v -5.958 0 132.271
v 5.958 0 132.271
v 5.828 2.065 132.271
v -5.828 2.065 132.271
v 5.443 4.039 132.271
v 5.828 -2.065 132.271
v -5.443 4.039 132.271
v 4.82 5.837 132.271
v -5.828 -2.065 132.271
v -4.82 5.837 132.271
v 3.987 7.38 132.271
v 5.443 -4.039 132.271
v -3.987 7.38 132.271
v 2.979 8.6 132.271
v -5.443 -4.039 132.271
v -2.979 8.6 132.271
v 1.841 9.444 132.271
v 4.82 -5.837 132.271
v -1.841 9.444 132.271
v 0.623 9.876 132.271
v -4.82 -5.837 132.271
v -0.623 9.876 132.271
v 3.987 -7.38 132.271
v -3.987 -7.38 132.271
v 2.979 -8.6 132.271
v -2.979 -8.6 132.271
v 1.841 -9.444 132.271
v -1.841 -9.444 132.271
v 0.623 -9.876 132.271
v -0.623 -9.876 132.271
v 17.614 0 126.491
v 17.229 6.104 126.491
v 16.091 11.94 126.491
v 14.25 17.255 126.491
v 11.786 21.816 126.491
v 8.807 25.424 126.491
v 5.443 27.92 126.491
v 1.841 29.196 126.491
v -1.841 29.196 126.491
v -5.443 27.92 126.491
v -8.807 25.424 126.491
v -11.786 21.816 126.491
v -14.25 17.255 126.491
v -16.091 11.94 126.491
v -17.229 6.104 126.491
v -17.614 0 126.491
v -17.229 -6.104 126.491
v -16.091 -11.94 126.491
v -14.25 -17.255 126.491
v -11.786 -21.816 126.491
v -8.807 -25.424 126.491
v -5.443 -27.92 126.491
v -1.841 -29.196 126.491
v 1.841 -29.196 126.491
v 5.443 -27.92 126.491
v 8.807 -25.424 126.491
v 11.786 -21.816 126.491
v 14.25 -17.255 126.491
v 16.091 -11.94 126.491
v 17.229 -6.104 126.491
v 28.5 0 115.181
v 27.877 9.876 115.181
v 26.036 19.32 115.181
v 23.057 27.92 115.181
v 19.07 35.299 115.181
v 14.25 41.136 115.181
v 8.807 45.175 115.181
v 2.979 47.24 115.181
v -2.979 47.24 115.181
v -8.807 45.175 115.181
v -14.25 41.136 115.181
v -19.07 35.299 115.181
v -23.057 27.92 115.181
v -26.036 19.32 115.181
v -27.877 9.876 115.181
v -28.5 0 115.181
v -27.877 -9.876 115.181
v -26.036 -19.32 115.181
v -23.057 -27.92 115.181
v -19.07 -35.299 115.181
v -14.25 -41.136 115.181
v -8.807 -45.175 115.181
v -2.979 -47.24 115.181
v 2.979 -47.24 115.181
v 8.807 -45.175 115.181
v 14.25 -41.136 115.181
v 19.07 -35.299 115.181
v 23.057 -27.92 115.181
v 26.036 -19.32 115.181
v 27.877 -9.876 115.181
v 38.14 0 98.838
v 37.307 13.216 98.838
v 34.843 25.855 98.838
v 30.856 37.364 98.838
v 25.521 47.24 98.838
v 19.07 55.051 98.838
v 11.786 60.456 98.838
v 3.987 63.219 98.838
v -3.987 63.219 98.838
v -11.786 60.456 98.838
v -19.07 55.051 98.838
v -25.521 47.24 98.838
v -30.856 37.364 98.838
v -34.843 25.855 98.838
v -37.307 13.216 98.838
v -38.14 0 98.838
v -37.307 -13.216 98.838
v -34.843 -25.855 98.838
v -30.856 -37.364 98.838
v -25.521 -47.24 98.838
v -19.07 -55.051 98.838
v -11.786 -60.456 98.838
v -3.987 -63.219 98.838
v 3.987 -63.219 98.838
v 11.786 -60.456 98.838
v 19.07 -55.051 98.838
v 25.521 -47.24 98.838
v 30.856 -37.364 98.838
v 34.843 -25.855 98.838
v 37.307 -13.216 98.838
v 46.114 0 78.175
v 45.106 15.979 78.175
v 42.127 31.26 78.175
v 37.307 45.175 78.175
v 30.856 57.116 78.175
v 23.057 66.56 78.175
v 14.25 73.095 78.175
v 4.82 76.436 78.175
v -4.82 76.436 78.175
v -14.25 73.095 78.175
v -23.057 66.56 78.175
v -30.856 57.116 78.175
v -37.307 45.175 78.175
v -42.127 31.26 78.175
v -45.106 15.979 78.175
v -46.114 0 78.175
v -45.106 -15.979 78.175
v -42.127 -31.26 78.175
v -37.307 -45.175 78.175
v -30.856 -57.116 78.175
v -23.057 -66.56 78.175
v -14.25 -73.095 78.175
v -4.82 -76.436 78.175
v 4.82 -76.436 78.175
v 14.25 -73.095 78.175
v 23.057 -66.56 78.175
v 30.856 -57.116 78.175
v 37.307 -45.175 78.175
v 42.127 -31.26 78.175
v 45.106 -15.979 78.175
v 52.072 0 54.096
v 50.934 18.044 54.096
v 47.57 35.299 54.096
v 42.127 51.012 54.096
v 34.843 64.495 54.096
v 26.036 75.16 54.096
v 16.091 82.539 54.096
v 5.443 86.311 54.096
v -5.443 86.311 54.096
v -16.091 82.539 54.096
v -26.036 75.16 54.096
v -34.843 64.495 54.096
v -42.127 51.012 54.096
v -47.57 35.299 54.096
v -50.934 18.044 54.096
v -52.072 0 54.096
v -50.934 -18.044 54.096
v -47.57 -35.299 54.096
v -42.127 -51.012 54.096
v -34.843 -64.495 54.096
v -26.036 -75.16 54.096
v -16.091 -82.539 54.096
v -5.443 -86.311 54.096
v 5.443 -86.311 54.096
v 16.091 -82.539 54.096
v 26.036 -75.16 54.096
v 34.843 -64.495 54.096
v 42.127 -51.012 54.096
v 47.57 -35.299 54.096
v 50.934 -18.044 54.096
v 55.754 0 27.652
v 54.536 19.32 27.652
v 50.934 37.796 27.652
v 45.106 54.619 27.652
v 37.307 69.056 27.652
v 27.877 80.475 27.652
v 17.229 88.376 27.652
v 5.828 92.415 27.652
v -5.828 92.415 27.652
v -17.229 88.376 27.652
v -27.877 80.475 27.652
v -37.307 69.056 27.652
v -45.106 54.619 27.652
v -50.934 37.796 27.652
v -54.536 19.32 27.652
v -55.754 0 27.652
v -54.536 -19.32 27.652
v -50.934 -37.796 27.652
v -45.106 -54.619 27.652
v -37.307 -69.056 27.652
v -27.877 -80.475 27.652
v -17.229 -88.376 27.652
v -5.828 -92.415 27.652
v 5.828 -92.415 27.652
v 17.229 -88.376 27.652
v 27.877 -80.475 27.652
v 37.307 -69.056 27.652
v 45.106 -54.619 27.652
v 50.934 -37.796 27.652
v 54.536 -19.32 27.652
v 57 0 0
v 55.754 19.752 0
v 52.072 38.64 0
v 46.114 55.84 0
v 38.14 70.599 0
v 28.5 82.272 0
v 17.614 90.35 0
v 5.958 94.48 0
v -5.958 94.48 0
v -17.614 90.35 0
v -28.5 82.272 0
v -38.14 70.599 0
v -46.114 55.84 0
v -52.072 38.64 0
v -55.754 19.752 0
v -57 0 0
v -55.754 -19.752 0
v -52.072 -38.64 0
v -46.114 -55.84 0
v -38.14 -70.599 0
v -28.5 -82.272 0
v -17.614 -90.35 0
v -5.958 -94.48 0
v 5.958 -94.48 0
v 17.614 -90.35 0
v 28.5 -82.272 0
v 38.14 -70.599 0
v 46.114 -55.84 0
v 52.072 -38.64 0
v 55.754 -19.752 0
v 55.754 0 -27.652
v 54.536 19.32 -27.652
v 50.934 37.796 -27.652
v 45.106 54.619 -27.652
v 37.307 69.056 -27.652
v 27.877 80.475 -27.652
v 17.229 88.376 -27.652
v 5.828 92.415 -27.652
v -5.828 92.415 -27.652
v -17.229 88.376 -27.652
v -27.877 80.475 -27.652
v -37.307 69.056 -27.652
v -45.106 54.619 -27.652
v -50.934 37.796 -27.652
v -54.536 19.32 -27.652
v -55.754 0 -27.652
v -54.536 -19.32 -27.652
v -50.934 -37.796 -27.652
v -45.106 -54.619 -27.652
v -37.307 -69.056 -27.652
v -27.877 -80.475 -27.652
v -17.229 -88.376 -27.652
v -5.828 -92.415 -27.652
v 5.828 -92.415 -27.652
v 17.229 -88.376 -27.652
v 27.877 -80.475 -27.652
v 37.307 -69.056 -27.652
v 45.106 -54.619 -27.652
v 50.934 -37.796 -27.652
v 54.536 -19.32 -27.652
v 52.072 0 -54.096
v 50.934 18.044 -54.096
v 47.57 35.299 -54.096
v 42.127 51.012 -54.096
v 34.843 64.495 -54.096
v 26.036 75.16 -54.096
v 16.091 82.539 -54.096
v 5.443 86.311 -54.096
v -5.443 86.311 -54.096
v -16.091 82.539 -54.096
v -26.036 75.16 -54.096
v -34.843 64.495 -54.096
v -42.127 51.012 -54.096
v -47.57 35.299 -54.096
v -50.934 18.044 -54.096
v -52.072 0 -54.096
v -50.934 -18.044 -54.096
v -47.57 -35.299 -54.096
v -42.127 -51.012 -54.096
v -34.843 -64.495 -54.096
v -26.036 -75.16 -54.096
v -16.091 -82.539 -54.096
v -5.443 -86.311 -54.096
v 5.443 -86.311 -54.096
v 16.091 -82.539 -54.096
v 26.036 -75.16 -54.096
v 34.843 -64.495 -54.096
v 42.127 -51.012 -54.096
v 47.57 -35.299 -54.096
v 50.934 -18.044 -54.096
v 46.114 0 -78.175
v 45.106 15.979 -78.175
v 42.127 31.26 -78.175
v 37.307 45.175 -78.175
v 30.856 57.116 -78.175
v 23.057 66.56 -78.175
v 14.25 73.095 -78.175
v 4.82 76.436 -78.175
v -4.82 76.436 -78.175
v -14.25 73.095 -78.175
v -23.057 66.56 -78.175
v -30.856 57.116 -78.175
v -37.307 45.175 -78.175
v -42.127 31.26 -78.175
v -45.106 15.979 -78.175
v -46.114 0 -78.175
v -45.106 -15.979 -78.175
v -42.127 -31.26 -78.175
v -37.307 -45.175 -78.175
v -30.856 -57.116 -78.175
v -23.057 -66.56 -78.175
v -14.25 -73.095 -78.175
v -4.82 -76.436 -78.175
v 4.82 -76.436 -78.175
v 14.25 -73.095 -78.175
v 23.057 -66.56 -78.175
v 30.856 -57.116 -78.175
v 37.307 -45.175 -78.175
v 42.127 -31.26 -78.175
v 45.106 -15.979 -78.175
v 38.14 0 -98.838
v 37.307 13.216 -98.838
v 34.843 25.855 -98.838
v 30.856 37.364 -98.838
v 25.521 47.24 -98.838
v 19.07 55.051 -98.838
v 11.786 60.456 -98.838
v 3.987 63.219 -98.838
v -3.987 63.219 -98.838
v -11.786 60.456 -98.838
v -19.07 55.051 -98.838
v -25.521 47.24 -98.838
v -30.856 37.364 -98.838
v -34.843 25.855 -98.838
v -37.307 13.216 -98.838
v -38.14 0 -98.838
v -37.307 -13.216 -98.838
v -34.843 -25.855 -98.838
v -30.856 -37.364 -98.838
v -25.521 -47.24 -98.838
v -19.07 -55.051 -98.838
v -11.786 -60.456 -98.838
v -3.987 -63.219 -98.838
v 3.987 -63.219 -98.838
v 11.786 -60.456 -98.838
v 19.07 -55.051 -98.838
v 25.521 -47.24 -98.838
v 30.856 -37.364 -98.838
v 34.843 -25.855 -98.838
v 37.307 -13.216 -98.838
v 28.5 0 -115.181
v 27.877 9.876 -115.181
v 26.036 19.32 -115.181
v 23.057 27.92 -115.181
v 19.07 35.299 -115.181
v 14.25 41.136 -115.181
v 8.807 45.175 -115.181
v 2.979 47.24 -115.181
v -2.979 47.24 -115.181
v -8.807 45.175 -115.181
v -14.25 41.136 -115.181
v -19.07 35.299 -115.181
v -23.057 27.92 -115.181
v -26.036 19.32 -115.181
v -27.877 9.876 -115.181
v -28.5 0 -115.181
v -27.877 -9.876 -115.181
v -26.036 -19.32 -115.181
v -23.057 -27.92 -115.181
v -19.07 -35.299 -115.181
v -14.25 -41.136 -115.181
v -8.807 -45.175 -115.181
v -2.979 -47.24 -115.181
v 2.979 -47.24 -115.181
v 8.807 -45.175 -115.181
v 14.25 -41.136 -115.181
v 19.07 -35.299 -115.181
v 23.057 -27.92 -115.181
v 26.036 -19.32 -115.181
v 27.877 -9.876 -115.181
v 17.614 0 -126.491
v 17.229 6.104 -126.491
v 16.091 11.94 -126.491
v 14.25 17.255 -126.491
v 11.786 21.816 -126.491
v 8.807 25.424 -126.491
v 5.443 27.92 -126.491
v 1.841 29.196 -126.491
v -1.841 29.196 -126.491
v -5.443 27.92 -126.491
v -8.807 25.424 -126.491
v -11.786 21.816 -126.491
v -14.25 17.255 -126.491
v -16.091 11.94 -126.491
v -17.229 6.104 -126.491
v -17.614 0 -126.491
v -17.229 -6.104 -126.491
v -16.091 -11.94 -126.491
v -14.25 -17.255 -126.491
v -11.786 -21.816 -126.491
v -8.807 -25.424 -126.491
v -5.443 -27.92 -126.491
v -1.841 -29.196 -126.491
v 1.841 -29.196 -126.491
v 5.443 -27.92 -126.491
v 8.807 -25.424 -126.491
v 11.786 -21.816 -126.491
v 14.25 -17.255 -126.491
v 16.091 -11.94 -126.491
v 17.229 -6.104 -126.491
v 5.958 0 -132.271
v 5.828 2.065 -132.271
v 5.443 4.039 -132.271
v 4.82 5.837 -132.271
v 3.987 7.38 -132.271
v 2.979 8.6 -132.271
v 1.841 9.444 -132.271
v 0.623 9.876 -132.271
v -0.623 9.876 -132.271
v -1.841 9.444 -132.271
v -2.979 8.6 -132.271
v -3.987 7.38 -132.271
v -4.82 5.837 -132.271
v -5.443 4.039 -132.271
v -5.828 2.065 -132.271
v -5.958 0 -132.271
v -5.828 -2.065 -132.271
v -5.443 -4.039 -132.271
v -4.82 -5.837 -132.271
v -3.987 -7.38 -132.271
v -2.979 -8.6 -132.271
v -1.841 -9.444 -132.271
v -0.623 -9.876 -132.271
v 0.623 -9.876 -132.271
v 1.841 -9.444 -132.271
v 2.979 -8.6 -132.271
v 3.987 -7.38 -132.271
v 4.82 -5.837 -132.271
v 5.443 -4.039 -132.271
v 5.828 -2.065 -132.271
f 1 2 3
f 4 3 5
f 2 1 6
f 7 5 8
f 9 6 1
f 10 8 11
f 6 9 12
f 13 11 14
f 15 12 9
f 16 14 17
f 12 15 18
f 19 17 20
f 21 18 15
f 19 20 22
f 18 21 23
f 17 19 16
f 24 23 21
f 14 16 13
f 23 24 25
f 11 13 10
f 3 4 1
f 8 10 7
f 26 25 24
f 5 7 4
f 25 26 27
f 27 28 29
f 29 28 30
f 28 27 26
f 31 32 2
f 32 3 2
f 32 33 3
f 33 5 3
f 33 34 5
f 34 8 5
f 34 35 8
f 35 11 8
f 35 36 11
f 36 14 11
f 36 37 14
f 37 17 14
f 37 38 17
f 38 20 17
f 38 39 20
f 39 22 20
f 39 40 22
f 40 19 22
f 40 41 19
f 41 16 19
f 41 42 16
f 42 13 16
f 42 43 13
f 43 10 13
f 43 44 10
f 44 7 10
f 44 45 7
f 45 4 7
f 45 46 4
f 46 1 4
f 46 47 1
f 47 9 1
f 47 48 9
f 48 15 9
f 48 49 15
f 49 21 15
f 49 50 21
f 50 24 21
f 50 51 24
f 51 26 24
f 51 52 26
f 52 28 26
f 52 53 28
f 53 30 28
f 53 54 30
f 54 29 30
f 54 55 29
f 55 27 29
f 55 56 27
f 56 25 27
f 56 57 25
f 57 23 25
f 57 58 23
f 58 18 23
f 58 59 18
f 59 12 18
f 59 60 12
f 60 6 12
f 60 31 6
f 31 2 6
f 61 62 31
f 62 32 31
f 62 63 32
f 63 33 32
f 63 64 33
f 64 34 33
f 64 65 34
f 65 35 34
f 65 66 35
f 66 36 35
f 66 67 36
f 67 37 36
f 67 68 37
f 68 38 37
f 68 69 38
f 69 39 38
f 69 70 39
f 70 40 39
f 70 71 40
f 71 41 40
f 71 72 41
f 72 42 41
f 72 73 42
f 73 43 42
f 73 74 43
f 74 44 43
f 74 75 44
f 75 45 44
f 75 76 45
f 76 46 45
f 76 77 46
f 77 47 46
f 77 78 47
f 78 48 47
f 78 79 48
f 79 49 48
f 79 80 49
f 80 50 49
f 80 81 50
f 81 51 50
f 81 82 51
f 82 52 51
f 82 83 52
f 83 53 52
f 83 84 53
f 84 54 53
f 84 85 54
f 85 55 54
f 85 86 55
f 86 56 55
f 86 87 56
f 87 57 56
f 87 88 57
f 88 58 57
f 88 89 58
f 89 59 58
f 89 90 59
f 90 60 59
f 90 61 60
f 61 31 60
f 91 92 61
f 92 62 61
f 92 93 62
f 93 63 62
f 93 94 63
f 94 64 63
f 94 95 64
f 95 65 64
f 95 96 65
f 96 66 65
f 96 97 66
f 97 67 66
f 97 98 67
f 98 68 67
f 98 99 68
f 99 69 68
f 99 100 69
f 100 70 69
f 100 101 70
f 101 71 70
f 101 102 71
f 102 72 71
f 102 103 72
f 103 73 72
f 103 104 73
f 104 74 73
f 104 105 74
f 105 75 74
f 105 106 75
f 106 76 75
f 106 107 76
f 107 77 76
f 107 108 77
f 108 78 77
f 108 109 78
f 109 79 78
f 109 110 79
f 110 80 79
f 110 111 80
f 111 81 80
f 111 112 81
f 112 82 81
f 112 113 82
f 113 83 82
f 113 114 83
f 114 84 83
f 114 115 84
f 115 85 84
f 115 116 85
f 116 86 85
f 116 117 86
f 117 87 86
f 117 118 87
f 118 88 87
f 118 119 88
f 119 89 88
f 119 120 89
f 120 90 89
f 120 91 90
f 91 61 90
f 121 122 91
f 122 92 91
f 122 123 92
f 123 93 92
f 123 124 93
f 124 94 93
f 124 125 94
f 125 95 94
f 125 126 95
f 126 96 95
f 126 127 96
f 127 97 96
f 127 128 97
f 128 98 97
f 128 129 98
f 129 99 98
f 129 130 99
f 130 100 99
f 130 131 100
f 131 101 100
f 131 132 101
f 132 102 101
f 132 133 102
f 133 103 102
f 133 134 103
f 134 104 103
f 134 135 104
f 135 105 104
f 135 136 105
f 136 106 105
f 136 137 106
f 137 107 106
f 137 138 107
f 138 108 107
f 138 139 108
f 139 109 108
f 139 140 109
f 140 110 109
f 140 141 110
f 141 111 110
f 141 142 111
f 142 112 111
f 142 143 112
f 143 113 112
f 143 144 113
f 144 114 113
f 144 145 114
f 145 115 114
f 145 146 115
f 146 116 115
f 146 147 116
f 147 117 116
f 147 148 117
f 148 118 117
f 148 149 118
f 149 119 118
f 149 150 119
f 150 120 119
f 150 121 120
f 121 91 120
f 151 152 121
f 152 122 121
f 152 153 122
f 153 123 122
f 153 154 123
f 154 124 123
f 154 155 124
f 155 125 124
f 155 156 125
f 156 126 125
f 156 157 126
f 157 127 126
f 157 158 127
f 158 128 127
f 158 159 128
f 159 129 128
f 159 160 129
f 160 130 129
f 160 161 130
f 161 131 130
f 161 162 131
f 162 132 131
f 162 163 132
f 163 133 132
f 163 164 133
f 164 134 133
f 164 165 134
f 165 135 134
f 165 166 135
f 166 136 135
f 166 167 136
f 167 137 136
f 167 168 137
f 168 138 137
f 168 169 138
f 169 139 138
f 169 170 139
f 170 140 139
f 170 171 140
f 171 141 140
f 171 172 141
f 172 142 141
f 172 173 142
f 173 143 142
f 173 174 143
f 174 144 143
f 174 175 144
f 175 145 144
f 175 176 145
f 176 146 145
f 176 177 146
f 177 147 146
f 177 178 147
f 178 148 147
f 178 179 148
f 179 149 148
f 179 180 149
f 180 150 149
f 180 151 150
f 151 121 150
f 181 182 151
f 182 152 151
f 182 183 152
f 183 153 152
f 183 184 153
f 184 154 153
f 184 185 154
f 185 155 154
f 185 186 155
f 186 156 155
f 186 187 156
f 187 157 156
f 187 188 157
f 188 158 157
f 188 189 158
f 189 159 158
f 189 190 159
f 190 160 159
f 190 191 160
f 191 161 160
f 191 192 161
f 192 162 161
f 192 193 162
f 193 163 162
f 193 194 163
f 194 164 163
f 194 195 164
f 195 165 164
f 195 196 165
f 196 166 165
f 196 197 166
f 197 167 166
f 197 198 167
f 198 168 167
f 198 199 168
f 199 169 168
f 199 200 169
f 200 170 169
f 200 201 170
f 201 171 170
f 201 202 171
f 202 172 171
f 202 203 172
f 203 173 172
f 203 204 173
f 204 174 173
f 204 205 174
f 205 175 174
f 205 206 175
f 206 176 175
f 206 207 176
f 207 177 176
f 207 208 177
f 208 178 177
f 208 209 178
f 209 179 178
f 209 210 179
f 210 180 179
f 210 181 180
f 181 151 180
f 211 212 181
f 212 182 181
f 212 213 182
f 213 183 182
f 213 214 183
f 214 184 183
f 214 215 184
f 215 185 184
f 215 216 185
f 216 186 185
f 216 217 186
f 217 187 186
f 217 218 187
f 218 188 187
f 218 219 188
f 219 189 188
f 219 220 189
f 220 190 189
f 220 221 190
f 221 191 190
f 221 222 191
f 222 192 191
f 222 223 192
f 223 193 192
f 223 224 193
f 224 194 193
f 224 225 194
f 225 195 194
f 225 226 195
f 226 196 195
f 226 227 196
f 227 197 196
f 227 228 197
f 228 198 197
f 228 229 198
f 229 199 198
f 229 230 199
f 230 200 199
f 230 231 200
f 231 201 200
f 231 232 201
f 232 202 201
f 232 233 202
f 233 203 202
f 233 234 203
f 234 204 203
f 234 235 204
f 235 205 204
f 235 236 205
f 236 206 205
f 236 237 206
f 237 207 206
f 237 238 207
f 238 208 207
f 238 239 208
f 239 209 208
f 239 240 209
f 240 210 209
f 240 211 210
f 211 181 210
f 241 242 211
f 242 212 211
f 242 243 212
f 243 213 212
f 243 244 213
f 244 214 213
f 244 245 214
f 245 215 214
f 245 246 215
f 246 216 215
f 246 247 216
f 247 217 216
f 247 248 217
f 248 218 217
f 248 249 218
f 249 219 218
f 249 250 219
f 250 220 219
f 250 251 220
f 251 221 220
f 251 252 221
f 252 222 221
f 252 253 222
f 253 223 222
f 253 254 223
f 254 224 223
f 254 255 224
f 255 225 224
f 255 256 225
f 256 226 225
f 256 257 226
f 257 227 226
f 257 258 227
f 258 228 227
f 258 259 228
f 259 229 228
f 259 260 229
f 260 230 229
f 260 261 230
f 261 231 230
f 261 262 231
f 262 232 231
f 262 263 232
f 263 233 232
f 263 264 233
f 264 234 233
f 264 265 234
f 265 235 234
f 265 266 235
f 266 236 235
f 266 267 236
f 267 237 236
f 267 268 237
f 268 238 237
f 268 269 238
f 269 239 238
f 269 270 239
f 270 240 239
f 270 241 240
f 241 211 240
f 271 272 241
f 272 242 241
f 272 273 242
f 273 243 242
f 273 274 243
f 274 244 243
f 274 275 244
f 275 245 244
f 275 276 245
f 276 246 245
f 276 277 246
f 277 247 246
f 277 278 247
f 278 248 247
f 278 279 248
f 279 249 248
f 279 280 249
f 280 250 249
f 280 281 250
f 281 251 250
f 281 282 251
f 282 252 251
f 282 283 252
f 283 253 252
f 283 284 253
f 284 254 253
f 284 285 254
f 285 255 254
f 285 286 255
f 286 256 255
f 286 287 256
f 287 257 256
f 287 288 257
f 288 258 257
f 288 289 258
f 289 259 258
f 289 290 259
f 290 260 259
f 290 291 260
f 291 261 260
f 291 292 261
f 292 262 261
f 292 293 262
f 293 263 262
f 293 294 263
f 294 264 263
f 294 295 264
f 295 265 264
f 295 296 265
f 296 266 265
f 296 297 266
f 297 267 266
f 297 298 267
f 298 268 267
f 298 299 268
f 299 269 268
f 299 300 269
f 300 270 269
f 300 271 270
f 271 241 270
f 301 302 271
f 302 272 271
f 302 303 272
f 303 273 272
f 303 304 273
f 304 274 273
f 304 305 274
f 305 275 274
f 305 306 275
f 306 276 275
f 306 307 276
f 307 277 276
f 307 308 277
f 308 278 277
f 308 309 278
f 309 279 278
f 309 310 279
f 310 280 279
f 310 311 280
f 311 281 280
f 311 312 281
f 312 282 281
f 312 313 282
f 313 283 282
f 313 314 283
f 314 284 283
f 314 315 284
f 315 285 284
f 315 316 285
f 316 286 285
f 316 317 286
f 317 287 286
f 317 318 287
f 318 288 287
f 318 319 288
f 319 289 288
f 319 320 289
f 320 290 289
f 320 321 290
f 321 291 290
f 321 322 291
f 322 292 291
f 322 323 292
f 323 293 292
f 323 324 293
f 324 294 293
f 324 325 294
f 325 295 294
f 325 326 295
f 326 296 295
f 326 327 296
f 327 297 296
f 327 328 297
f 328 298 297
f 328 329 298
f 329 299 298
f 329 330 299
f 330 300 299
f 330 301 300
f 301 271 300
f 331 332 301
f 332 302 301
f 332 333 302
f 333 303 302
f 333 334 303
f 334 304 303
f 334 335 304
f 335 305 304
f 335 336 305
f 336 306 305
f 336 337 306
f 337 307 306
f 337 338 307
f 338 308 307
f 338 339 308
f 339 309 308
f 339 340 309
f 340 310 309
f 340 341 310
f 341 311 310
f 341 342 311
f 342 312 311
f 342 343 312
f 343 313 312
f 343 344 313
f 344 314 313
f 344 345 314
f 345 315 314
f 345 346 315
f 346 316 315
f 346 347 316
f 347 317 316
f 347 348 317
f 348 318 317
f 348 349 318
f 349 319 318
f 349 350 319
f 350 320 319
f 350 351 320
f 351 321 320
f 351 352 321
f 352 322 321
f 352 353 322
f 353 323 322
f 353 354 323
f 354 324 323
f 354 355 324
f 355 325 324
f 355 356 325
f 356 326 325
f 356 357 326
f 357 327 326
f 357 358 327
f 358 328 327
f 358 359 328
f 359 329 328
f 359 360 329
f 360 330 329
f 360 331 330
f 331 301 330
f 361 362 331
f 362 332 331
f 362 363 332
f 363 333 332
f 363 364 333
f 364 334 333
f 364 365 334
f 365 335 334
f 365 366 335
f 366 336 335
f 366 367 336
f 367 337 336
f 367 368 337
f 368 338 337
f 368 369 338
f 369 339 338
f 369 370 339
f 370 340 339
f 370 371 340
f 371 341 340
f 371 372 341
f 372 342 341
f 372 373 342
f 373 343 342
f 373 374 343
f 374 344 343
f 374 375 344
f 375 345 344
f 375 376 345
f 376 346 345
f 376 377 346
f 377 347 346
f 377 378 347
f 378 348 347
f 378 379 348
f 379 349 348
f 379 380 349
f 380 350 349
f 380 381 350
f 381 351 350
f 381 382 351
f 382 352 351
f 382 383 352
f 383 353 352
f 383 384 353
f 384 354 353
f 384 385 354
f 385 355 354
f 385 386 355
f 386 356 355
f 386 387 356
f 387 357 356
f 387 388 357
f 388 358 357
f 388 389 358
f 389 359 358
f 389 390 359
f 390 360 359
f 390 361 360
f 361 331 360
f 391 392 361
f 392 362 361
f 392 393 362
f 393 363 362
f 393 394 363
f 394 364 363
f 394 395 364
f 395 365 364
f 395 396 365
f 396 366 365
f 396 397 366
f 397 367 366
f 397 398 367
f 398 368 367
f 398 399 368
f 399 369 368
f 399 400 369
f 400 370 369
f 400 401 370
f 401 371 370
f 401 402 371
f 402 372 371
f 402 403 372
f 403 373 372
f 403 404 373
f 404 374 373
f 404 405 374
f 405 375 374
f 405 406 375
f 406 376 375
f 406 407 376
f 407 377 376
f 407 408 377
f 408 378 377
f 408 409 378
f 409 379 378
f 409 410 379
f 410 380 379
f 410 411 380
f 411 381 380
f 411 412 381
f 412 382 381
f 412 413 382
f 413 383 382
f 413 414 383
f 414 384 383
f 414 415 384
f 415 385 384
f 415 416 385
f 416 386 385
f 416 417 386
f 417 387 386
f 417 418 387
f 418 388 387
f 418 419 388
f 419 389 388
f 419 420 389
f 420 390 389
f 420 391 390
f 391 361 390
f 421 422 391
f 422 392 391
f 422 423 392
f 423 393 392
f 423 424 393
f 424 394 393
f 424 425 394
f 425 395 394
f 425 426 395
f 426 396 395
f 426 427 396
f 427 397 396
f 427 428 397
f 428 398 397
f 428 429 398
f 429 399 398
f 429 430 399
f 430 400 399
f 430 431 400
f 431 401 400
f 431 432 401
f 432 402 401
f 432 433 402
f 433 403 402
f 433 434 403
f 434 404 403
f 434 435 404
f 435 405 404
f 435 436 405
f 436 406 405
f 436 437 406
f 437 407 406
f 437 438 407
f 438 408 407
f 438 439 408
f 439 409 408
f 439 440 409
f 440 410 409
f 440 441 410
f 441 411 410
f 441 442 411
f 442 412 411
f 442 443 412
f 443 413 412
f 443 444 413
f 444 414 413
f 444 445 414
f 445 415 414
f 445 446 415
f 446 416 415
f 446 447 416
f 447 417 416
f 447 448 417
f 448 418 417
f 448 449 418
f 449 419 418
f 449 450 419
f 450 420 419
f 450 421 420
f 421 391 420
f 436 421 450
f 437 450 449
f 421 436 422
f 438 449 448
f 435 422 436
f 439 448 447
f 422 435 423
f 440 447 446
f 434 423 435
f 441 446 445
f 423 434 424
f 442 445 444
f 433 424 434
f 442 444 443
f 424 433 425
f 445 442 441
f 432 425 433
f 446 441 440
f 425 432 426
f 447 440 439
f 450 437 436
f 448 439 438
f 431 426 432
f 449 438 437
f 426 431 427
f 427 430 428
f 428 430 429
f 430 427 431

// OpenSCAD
// Generated by SolidPython 1.0.1 on 2020-07-29 00:39:25


scale(v = [3, 5, 7]) {
	sphere(r = 19);
}
/***********************************************
*********      SolidPython code:      **********
************************************************
 
# import packages: SolidPython
from solid import *
from solid.utils import *
from itertools import chain, combinations


class Resize:

    def __init__(self, scad_file):
        self.scad_file = scad_file
        #self.scad_file = import_scad(scad_file)
        # cone/cylinder param:
        self.r1 = 0
        self.r2 = 0
        self.h = 0
        # rectangular prism param:
        self.w = 0
        self.l = 0
        # ellipse param:
        self.r = 0

    # import OpenScad code (file name corresponds to shape)


    # classify shape + parameters
    def assign(self, param1, param2, param3):
        if self.scad_file == 'cone.scad':
            self.r1 = param1
            self.r2 = param2
            self.h = param3
        elif self.scad_file == 'cylinder.scad':
            self.r1 = param1
            self.r2 = param2
            self.h = param3
        elif self.scad_file == 'rectangularPrism.scad':
            self.h = param1
            self.l = param2
            self.w = param3
        else:
            self.r = param1
            self.h = param2

    # resize parameters
    def iterate(self):
        x = range(3, 20, 2)
        i = 1
        if self.scad_file == 'cone.scad':
            tempList = list(combinations(x, 2))
            for temp in tempList:
                param1 = temp[0]
                param2 = temp[1]
                filepath = 'produced_scad_files/' + 'cone' + str(param1) + '_' + str(param2) + '_' + '.scad'
                scad_render_to_file(cylinder(h=param1, r1=param2, r2=0), filepath)

        elif self.scad_file == 'cylinder.scad':
            tempList = list(combinations(x, 3))
            for temp in tempList:
                param1 = temp[0]
                param2 = temp[1]
                filepath = 'produced_scad_files/' + 'cylinder' + str(param1) + '_' + str(param2) + '_' + '.scad'
                scad_render_to_file(cylinder(h=param1, r1=param2, r2=param2), filepath)

        elif self.scad_file == 'rectangularPrism.scad':
            tempList = list(combinations(x, 3))
            for temp in tempList:
                param1 = temp[0]
                param2 = temp[1]
                param3 = temp[2]
                filepath = 'produced_scad_files/' + 'rectangularPrism' + str(param1) + '_' + str(param2) + '_' + str(
                    param3) + '.scad'
                scad_render_to_file(cube(size=(param1, param2, param3)), filepath)

        elif self.scad_file == 'ellipse.scad':
            tempList = list(combinations(x, 4))
            for temp in tempList:
                param1 = temp[0]
                param2 = temp[1]
                param3 = temp[2]
                param4 = temp[3]
                filepath = 'produced_scad_files/' + 'ellipse' + str(param1) + '_' + str(param2) + '_' + str(param3) + '_' + str(param4) + '.scad'
                scad_render_to_file(scale([param1, param2, param3])(sphere(r=param4)), filepath)

    def render_to_scadfile(self):
        scad_render_to_file(scad, 'example.scad') 
 
************************************************/
